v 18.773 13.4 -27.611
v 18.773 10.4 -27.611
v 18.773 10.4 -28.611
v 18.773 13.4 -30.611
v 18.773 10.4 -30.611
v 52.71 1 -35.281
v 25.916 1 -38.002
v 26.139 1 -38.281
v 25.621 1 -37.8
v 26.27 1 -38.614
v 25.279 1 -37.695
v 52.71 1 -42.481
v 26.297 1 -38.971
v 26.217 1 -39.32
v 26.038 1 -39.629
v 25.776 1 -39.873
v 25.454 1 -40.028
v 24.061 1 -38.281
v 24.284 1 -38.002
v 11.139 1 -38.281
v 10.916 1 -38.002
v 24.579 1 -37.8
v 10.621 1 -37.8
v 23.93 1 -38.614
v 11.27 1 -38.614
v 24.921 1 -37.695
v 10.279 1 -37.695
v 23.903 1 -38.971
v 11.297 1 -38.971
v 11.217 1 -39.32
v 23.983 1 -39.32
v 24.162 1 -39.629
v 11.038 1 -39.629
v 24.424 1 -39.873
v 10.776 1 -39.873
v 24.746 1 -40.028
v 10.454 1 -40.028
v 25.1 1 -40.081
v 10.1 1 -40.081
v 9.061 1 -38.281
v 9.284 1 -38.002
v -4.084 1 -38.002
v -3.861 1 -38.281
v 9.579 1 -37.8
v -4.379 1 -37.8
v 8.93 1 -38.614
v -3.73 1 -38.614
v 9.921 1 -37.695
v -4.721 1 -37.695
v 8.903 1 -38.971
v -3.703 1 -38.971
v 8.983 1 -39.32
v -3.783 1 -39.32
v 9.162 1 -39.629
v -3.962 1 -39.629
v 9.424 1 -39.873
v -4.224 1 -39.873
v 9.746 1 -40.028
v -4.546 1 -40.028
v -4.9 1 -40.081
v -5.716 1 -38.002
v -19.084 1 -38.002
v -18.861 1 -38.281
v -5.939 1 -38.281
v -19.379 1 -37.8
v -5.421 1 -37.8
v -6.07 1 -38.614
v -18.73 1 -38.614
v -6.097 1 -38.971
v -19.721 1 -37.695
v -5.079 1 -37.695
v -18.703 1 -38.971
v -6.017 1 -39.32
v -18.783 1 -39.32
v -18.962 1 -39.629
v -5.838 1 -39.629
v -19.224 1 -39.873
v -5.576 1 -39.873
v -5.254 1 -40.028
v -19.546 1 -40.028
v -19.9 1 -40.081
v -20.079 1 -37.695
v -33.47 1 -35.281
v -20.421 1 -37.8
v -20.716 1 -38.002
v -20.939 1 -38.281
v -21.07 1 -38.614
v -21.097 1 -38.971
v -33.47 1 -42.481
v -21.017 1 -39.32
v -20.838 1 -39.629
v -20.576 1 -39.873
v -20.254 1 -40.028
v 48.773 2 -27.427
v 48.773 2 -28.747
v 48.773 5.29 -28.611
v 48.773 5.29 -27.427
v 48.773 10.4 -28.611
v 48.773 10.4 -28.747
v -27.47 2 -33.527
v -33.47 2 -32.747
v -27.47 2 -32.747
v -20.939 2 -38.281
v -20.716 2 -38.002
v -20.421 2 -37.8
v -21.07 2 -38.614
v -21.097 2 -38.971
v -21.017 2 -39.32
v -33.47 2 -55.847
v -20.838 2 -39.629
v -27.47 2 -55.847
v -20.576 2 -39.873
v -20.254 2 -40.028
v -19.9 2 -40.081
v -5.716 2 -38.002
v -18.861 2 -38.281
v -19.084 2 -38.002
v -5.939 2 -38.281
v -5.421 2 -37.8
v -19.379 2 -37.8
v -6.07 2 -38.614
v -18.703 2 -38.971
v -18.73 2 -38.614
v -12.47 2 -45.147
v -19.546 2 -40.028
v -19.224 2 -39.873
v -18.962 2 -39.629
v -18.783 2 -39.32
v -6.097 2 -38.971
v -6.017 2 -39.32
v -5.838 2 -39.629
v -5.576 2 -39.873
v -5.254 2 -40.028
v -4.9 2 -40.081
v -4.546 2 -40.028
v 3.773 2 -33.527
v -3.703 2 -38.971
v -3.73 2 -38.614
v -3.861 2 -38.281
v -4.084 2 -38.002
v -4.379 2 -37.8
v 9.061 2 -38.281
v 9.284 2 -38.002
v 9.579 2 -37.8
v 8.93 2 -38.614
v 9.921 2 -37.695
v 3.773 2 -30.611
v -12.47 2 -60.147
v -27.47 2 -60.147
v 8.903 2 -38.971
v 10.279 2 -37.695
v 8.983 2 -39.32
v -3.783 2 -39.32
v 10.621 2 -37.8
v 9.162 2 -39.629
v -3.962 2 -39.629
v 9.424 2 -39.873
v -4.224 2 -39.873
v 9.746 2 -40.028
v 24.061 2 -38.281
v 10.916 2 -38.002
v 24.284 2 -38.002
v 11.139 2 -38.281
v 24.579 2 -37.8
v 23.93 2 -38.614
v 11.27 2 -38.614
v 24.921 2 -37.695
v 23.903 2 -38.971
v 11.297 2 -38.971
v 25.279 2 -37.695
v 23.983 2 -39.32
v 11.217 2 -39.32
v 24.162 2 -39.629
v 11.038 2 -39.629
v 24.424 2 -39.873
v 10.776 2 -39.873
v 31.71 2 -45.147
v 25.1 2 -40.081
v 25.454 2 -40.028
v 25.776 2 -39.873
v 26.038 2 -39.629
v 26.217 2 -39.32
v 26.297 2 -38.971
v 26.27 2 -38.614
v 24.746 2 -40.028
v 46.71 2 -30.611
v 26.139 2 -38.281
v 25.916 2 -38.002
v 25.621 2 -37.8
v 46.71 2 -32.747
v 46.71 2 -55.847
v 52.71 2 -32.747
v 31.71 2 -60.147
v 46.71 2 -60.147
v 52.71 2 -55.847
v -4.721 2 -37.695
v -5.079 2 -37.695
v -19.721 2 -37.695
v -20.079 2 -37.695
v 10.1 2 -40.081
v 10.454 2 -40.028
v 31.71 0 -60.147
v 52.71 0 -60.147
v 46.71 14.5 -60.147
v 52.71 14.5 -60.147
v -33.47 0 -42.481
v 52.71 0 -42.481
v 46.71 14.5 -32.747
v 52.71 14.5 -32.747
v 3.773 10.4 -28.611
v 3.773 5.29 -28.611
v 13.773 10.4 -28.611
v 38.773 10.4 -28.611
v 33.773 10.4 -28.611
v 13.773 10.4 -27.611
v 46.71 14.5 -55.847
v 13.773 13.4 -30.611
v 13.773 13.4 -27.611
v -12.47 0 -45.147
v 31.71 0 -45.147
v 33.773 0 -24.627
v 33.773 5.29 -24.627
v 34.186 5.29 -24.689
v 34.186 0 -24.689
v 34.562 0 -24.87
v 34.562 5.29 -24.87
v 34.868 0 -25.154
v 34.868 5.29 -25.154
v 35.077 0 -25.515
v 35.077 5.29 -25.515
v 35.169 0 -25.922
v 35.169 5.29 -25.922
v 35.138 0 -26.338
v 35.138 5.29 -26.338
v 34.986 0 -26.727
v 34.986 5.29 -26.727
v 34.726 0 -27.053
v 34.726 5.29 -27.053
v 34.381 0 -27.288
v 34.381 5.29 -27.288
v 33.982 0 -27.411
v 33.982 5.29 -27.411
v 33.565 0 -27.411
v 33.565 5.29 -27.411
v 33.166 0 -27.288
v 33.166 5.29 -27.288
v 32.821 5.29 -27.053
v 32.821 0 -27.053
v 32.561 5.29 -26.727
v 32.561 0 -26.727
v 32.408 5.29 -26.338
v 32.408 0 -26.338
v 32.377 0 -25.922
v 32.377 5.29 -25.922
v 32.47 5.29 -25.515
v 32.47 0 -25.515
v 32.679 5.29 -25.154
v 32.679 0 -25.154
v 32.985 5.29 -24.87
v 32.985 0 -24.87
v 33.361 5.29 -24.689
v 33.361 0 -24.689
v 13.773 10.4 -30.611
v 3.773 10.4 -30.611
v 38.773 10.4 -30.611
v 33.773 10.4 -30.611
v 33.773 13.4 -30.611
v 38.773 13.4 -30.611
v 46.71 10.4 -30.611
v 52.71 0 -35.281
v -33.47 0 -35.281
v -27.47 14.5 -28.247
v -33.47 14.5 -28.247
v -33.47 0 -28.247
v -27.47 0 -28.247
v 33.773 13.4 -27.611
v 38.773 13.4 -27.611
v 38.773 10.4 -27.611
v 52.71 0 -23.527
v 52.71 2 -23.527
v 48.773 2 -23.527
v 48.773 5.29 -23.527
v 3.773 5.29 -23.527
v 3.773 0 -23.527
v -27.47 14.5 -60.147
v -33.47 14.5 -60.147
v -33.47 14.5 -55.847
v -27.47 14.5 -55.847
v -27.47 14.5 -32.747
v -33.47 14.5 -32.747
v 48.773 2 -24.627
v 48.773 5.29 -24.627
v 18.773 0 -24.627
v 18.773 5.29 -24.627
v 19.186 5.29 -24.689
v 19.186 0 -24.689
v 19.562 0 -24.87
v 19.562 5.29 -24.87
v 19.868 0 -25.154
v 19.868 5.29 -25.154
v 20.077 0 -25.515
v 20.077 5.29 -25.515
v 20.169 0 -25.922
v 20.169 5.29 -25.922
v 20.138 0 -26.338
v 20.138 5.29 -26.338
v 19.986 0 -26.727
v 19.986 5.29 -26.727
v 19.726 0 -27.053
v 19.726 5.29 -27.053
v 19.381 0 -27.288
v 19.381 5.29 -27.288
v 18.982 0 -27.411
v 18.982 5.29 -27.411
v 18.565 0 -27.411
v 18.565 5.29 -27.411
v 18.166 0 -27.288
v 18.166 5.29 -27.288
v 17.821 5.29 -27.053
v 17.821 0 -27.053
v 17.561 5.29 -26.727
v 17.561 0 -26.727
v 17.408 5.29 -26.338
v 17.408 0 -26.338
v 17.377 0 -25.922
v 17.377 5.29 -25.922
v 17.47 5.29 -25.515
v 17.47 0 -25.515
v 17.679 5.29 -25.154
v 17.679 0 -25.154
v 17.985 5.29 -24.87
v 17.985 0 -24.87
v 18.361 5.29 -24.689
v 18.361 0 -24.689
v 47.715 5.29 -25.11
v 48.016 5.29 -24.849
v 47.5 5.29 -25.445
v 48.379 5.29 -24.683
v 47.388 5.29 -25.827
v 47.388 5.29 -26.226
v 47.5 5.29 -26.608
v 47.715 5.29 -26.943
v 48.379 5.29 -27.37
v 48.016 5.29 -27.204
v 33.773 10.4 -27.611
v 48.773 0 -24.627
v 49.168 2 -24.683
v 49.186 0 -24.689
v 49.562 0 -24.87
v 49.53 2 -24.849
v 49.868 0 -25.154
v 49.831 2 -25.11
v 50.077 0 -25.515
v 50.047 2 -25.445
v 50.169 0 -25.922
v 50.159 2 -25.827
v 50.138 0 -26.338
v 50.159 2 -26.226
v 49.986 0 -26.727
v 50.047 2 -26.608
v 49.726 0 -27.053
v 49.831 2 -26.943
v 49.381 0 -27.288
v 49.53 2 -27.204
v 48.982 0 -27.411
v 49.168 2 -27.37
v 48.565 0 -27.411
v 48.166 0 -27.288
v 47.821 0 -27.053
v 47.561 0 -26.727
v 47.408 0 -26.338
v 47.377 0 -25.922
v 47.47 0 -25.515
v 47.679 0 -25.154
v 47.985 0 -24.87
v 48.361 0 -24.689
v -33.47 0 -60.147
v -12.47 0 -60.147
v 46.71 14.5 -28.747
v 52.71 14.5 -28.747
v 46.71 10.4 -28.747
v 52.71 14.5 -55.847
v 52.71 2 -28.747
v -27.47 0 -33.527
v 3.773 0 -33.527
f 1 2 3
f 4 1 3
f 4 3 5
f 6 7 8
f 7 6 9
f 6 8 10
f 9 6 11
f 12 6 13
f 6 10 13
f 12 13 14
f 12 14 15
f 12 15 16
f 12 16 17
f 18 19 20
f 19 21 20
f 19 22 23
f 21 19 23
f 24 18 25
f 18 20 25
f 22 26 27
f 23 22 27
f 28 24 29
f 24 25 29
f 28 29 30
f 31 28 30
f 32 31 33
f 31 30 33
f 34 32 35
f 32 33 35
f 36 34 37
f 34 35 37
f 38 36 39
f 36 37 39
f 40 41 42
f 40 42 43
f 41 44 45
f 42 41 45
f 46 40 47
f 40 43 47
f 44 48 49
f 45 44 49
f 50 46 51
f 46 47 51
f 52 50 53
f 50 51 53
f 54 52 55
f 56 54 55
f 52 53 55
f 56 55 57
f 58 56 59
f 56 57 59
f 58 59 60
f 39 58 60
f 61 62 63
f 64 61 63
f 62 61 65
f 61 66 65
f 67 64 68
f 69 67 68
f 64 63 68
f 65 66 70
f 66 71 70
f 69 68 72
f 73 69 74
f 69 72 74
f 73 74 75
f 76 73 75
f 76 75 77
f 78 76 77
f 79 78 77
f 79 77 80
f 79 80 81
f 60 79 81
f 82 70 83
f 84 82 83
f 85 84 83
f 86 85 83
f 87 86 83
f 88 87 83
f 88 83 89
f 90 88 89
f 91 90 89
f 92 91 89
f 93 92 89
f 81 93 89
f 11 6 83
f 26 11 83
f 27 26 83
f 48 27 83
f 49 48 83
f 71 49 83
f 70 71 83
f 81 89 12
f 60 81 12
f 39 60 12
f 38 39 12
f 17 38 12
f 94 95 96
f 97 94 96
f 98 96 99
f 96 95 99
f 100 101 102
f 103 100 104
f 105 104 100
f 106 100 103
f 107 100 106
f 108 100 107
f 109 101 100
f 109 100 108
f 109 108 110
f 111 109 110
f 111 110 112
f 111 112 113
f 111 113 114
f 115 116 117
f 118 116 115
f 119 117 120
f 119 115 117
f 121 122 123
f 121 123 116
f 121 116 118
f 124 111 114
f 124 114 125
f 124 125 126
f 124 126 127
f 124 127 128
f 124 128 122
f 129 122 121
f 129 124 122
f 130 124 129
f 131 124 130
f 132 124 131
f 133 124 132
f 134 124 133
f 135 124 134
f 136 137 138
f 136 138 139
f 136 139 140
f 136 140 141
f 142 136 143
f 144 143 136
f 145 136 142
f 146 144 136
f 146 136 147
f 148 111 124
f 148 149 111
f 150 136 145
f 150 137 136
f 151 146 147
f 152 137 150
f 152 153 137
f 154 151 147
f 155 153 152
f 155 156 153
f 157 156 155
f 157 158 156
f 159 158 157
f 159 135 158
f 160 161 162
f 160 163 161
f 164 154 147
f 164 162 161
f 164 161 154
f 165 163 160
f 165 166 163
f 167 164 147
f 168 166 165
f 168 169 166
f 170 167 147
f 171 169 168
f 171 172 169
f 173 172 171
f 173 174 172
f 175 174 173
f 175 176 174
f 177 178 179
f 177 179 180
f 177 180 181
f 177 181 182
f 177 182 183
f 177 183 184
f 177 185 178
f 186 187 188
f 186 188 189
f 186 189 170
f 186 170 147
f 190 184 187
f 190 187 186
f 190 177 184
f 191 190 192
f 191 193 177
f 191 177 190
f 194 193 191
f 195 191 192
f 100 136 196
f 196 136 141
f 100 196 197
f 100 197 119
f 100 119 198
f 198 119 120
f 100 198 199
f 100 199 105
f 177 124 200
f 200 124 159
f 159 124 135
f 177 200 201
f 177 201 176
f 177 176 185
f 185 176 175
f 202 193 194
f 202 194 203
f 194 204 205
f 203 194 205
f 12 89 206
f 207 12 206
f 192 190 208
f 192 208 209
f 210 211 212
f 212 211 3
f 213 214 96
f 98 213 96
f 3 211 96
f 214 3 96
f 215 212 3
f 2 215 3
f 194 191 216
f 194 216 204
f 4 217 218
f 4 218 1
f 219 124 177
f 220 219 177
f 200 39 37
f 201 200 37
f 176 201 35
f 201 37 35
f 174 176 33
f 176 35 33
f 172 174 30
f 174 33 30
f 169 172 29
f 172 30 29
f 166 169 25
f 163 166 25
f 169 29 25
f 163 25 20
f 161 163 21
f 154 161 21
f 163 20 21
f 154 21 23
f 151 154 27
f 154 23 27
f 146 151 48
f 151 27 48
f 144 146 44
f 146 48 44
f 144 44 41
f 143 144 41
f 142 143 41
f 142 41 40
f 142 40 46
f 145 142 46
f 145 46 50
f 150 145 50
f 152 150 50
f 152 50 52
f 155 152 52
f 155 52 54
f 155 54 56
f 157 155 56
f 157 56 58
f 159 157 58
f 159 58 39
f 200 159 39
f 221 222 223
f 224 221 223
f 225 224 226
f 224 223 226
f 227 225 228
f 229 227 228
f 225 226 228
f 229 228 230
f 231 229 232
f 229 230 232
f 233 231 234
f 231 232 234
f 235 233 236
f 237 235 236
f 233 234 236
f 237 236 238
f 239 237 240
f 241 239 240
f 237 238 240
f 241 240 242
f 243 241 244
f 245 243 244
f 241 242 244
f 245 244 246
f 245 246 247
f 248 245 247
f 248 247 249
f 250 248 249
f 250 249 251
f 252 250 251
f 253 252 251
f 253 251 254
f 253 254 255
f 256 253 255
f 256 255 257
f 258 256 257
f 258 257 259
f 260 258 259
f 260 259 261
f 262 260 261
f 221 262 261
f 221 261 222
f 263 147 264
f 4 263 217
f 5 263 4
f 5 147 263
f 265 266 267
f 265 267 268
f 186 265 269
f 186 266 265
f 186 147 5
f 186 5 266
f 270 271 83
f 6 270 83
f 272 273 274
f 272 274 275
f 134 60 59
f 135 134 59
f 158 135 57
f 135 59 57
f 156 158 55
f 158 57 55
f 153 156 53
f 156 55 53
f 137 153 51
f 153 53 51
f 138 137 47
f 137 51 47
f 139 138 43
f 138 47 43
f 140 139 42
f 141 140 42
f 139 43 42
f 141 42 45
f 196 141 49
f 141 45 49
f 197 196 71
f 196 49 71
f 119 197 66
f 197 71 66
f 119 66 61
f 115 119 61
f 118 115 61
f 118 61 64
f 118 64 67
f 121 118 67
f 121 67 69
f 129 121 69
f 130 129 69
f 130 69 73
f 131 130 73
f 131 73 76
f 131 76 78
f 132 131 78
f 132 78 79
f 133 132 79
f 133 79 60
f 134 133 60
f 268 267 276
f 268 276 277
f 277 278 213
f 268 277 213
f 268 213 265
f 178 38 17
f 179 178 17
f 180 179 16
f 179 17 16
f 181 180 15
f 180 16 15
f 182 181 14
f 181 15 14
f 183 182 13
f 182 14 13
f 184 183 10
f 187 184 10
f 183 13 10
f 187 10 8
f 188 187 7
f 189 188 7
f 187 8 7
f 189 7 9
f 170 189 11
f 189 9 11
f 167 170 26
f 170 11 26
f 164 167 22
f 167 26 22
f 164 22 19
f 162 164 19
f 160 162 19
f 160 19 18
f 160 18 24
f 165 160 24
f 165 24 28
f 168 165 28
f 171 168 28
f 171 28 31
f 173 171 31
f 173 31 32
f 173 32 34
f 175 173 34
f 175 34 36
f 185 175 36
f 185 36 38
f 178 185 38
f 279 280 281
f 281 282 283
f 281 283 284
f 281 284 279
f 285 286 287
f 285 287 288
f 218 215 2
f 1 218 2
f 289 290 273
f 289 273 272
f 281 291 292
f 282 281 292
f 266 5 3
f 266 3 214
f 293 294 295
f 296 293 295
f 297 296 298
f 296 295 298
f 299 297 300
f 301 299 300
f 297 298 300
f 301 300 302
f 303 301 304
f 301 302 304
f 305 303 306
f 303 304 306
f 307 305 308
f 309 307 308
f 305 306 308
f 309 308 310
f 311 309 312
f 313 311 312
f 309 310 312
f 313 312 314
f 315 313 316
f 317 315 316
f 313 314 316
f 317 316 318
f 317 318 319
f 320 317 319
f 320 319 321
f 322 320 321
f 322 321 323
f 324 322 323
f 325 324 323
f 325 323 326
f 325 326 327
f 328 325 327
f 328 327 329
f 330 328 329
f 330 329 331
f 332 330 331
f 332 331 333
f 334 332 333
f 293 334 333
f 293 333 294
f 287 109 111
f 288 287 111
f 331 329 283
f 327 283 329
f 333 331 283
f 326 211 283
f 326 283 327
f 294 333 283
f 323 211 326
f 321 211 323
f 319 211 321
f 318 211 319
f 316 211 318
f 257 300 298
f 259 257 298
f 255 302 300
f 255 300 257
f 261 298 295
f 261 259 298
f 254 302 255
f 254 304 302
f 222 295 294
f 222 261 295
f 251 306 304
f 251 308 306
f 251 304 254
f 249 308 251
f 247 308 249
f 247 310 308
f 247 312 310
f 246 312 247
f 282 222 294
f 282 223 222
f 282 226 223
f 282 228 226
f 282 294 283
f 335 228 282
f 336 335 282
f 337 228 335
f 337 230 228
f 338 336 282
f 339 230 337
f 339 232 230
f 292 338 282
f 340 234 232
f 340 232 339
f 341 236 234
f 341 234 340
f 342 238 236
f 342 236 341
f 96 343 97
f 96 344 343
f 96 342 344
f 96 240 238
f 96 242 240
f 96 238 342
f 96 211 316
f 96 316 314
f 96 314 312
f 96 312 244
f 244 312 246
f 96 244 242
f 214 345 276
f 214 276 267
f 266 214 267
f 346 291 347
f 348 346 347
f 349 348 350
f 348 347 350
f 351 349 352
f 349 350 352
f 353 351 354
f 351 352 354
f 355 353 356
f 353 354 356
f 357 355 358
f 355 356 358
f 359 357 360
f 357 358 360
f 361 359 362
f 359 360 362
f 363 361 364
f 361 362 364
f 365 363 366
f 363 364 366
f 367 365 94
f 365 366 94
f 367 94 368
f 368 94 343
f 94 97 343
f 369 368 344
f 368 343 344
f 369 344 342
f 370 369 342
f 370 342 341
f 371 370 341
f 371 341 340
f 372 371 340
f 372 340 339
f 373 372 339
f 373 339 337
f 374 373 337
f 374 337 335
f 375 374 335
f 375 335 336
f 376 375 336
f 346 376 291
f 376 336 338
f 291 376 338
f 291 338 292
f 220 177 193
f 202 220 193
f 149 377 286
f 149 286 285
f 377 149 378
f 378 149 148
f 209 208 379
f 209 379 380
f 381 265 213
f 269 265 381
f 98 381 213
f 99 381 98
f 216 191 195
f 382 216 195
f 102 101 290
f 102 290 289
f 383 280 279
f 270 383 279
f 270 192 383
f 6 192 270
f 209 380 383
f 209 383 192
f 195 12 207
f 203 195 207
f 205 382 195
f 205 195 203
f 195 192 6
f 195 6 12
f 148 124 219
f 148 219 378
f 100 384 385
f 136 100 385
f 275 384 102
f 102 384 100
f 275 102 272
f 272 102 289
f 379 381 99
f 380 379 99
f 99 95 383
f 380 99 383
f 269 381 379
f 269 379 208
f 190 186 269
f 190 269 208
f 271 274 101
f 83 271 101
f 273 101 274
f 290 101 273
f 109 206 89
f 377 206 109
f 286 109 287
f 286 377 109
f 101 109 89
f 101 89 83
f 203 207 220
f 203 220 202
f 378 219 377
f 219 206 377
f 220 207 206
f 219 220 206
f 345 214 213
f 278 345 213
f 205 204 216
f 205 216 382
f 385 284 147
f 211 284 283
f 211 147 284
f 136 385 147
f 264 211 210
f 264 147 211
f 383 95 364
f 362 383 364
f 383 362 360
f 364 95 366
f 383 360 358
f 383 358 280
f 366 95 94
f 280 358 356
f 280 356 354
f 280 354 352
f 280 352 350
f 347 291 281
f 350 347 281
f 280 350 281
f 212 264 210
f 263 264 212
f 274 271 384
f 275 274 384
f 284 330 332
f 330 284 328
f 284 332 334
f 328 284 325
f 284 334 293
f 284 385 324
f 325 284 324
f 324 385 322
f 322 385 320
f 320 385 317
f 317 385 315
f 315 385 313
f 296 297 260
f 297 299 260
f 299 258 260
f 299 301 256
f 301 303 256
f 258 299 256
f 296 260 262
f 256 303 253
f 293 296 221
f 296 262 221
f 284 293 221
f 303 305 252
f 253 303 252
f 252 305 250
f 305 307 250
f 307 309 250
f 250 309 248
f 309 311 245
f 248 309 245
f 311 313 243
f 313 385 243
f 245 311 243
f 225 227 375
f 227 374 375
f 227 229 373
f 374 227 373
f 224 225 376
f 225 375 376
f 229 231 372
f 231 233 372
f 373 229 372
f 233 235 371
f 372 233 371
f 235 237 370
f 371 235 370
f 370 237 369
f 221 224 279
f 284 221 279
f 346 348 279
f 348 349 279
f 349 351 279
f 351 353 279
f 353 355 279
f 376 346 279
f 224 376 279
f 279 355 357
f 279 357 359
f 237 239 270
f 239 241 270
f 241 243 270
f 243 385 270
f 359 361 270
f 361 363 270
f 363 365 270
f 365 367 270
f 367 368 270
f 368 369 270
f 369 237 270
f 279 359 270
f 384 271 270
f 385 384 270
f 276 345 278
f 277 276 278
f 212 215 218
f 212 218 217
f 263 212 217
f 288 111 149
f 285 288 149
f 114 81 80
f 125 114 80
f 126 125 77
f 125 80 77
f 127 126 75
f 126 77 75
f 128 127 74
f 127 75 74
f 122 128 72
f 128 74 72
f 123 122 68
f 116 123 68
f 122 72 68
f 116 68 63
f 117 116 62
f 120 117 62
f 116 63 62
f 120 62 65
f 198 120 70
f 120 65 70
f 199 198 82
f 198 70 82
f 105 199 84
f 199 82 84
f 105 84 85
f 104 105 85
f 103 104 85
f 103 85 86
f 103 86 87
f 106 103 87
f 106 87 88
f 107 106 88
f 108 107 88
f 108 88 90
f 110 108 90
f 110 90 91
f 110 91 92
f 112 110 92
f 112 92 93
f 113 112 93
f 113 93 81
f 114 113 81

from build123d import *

# Parameters (mm, degrees)
EXTRUDE_1_DEPTH           = 2
CUT_EXTRUDE_1_DEPTH       = 2
SKETCH_3_W                = 3
SKETCH_3_H                = 3
EXTRUDE_2_DEPTH           = 12
EXTRUDE_3_DEPTH           = 12
SKETCH_5_R                = 0.75
CUT_EXTRUDE_2_DEPTH       = 12
SKETCH_6_R                = 0.75
CUT_EXTRUDE_3_DEPTH       = 12
SKETCH_7_W                = 26
SKETCH_7_H                = 60
EXTRUDE_4_DEPTH           = 2
SKETCH_8_W                = 3.705700703
SKETCH_8_H                = 4.457179677
SKETCH_8_W_2              = 1.523965484
SKETCH_8_H_2              = 4.5
EXTRUDE_5_DEPTH           = 14.4
SKETCH_9_R                = 0.95
CUT_EXTRUDE_4_DEPTH       = 14.4
SKETCH_10_W               = 26
SKETCH_10_H               = 8
EXTRUDE_6_DEPTH           = 2
SKETCH_11_W               = 4.5
SKETCH_11_H               = 4.5
EXTRUDE_7_DEPTH           = 14.4
SKETCH_12_R               = 0.95
CUT_EXTRUDE_5_DEPTH       = 14.4
FILLET_2_R                = 1
SKETCH_13_W               = 4.5
SKETCH_13_H               = 4.5
CUT_EXTRUDE_6_DEPTH       = 14.4
SKETCH_15_R               = 1.75
CUT_EXTRUDE_8_DEPTH       = 12
SKETCH_14_W               = 3
SKETCH_14_H               = 3
CUT_EXTRUDE_9_DEPTH       = 12
SKETCH_16_W               = 4.5
SKETCH_16_H               = 4.5
SKETCH_16_W_2             = 4.196061315
EXTRUDE_8_DEPTH           = 14.4
CUT_EXTRUDE_11_DEPTH      = 10
SKETCH_19_R               = 0.95
CUT_EXTRUDE_12_DEPTH      = 10
FILLET_3_R                = 1
SKETCH_21_W               = 2.552667246
SKETCH_21_H               = 4.5
EXTRUDE_9_DEPTH           = 14.4
CUT_EXTRUDE_14_DEPTH      = 79.074165065
CUT_EXTRUDE_14_DEPTH_BACK = 79.074165065
SKETCH_9_3_R              = 0.95
EXTRUDE_10_DEPTH          = 2
SKETCH_31_W               = 30
SKETCH_31_H               = 16
EXTRUDE_13_DEPTH          = 2
SKETCH_36_W               = 30
SKETCH_36_H               = 4
CUT_EXTRUDE_21_DEPTH      = 10
SKETCH_38_W               = 72
SKETCH_38_H               = 73.901085024
CUT_EXTRUDE_22_DEPTH      = 36.5
SKETCH_39_W               = 4.5
SKETCH_39_H               = 4.5
CUT_EXTRUDE_23_DEPTH      = 14.4
SKETCH_62_W               = 10
SKETCH_62_H               = 2
EXTRUDE_22_DEPTH          = 11.717956628
SKETCH_40_W               = 50
SKETCH_40_H               = 7.2
CUT_EXTRUDE_24_DEPTH      = 1
SKETCH_41_R               = 1.2
CUT_EXTRUDE_25_DEPTH      = 89.212970365
SKETCH_44_W               = 9
SKETCH_44_H               = 47.717956628
EXTRUDE_15_DEPTH          = 2
SKETCH_47_W               = 14
SKETCH_47_H               = 7.2
CUT_EXTRUDE_29_DEPTH      = 1
SKETCH_48_W               = 7
SKETCH_48_H               = 47.717956628
EXTRUDE_17_DEPTH          = 2
SKETCH_54_W               = 88
SKETCH_54_H               = 7.2
CUT_EXTRUDE_32_DEPTH      = 1
SKETCH_56_W               = 88
SKETCH_56_H               = 0.717956628
CUT_EXTRUDE_34_DEPTH      = 10
SKETCH_63_W               = 48.226708388
SKETCH_63_H               = 2
EXTRUDE_23_DEPTH          = 10
SKETCH_65_W               = 45
SKETCH_65_H               = 2
EXTRUDE_24_DEPTH          = 8.4
SKETCH_66_W               = 5
SKETCH_66_H               = 3
EXTRUDE_25_DEPTH          = 3
SKETCH_67_W               = 45
SKETCH_67_H               = 3.29
EXTRUDE_26_DEPTH          = 5.084597618
SKETCH_68_R               = 1.4
CUT_EXTRUDE_35_DEPTH      = 8
CUT_EXTRUDE_36_DEPTH      = 97.788884386
CUT_EXTRUDE_36_DEPTH_BACK = 97.788884386
SKETCH_69_W               = 46
SKETCH_69_H               = 12
SKETCH_75_W               = 6
SKETCH_75_H               = 4.3
SKETCH_75_H_2             = 4.5
SKETCH_75_H_3             = 4
EXTRUDE_30_DEPTH          = 12.5
EXTRUDE_31_DEPTH          = 0.71
SKETCH_77_W               = 6
SKETCH_77_H               = 2
EXTRUDE_32_DEPTH          = 5.279303266
CUT_EXTRUDE_39_DEPTH      = 2.53
SKETCH_79_W               = 86.18
SKETCH_79_H               = 8.379303266
CUT_EXTRUDE_40_DEPTH      = 2
SKETCH_80_W               = 44.18
SKETCH_80_H               = 15
CUT_EXTRUDE_41_DEPTH      = 12.5


with BuildPart() as part:
    # 草图1 → 凸台-拉伸1 (new body)
    with BuildSketch(Plane(origin=(0, 0, 0), x_dir=(1, 0, 0), z_dir=(0, 1, 0))):
        with BuildLine():
            Line((5, 0), (31, 0))
            Line((31, 0), (31, -12.266105287))
            Line((31, -12.266105287), (17.561663747, -40))
            Line((17.561663747, -40), (-17.561663747, -40))
            Line((-17.561663747, -40), (-31, -12.266105287))
            Line((-31, -12.266105287), (-31, 0))
            Line((-31, 0), (-5, 0))
            Line((-5, 0), (-5, -5))
            ThreePointArc((-5, -5), (0, -10), (5, -5))
            Line((5, -5), (5, 0))
        make_face()
    extrude(amount=EXTRUDE_1_DEPTH)

    # 草图2 → 切除-拉伸1 (cut)
    with BuildSketch(Plane.XZ):
        Polygon((-31, 0), (-24.370648345, 19.60824232), (-13.013264916, 35.515995547), (-4.410164775, 40), (-17.561663747, 40), (-31, 12.266105287), align=None)
    cut_extrude_1 = extrude(amount=-CUT_EXTRUDE_1_DEPTH, mode=Mode.SUBTRACT)

    # 镜向1: 切除-拉伸1 across plane
    add(cut_extrude_1.mirror(Plane(origin=(0, 0, 0), x_dir=(0, 0, 1), z_dir=(1, 0, 0))), mode=Mode.SUBTRACT)

    # 草图3 → 凸台-拉伸2 (add)
    with BuildSketch(Plane(origin=(0, 2, 0), x_dir=(1, 0, 0), z_dir=(0, 1, 0))):
        with Locations((0.264476572, -30.687696452)):
            Rectangle(SKETCH_3_W, SKETCH_3_H)
    extrude(amount=EXTRUDE_2_DEPTH)

    # 草图4 → 凸台-拉伸3 (add)
    with BuildSketch(Plane(origin=(0, 2, 0), x_dir=(1, 0, 0), z_dir=(0, 1, 0))):
        Polygon((12.325065561, -24.884390537), (14.54097081, -22.857655099), (12.419650467, -20.736334755), (10.298330123, -22.857655099), align=None)
    extrude_3 = extrude(amount=EXTRUDE_3_DEPTH)

    # 草图5 → 切除-拉伸2 (cut)
    with BuildSketch(Plane.ZY.offset(1.235523428)):
        with Locations((30.687696452, 11.5)):
            Circle(SKETCH_5_R)
        with Locations((30.687696452, 4.5)):
            Circle(SKETCH_5_R)
    extrude(amount=-CUT_EXTRUDE_2_DEPTH, mode=Mode.SUBTRACT)

    # 草图6 → 切除-拉伸3 (cut)
    with BuildSketch(Plane(origin=(18.192824737, 0, 30.752149712), x_dir=(0.7071067811865495, 0, 0.7071067811865457), z_dir=(-0.7071067811865457, 0, 0.7071067811865495))):
        with Locations((-9.798264607, 11.5)):
            Circle(SKETCH_6_R)
        with Locations((-9.798264607, 4.5)):
            Circle(SKETCH_6_R)
    cut_extrude_3 = extrude(amount=-CUT_EXTRUDE_3_DEPTH, mode=Mode.SUBTRACT)

    # 镜向2: 凸台-拉伸3, 切除-拉伸3 across plane
    add(extrude_3.mirror(Plane(origin=(0, 0, 0), x_dir=(0, 0, 1), z_dir=(1, 0, 0))))
    add(cut_extrude_3.mirror(Plane(origin=(0, 0, 0), x_dir=(0, 0, 1), z_dir=(1, 0, 0))), mode=Mode.SUBTRACT)

    # 草图7 → 凸台-拉伸4 (add)
    with BuildSketch(Plane(origin=(0, 2, 0), x_dir=(1, 0, 0), z_dir=(0, 1, 0))):
        with Locations((-18, 30)):
            Rectangle(SKETCH_7_W, SKETCH_7_H)
        with Locations((18, 30)):
            Rectangle(SKETCH_7_W, SKETCH_7_H)
    extrude(amount=-EXTRUDE_4_DEPTH)

    # 草图8 → 凸台-拉伸5 (add)
    with BuildSketch(Plane(origin=(0, 2, 0), x_dir=(1, 0, 0), z_dir=(0, 1, 0))):
        with Locations((28.776217622, 3.180021452)):
            Rectangle(SKETCH_8_W, SKETCH_8_H)
        with Locations((27.685350012, 30.55861129)):
            Rectangle(SKETCH_8_W_2, SKETCH_8_H_2)
    extrude_5 = extrude(amount=EXTRUDE_5_DEPTH)

    # 草图9 → 切除-拉伸4 (cut)
    with BuildSketch(Plane(origin=(31, 0, 0), x_dir=(0, 0, -1), z_dir=(1, 0, 0))):
        with Locations((3.00861129, 8.2)):
            Circle(SKETCH_9_R)
        with Locations((30.70861129, 8.2)):
            Circle(SKETCH_9_R)
    cut_extrude_4 = extrude(amount=-CUT_EXTRUDE_4_DEPTH, mode=Mode.SUBTRACT)

    # 镜向3: 凸台-拉伸5, 切除-拉伸4 across plane
    add(extrude_5.mirror(Plane(origin=(0, 0, 0), x_dir=(0, 0, 1), z_dir=(1, 0, 0))))
    add(cut_extrude_4.mirror(Plane(origin=(0, 0, 0), x_dir=(0, 0, 1), z_dir=(1, 0, 0))), mode=Mode.SUBTRACT)

    # 草图10 → 凸台-拉伸6 (add)
    with BuildSketch(Plane(origin=(0, 2, 0), x_dir=(1, 0, 0), z_dir=(0, 1, 0))):
        with Locations((-18, 64)):
            Rectangle(SKETCH_10_W, SKETCH_10_H)
        Polygon((5, 60), (5, 68), (30.798641436, 68), (31, 60), align=None)
    extrude(amount=-EXTRUDE_6_DEPTH)

    # 草图11 → 凸台-拉伸7 (add)
    with BuildSketch(Plane(origin=(0, 2, 0), x_dir=(1, 0, 0), z_dir=(0, 1, 0))):
        with Locations((18.529999999, 37.05861129)):
            Rectangle(SKETCH_11_W, SKETCH_11_H)
        with Locations((18.529999999, 64.45861129)):
            Rectangle(SKETCH_11_W, SKETCH_11_H)
    extrude(amount=EXTRUDE_7_DEPTH)

    # 草图12 → 切除-拉伸5 (cut)
    with BuildSketch(Plane.ZY.offset(-16.279999999)):
        with Locations((-36.90861129, 8.2)):
            Circle(SKETCH_12_R)
        with Locations((-64.60861129, 8.2)):
            Circle(SKETCH_12_R)
    extrude(amount=-CUT_EXTRUDE_5_DEPTH, mode=Mode.SUBTRACT)

    # 圆角2
    fillet_2_edges = [part.edges().sort_by_distance(p)[0] for p in [
        (26.92336727, 9.2, -5.40861129),
        (26.92336727, 9.2, -28.30861129),
        (-26.92336727, 9.2, -5.40861129),
        (-26.92336727, 9.2, -28.30861129),
        (16.279999999, 9.2, -39.30861129),
        (16.279999999, 9.2, -62.20861129),
    ]]
    fillet(fillet_2_edges, radius=FILLET_2_R)

    # 草图13 → 切除-拉伸6 (cut)
    with BuildSketch(Plane(origin=(0, 16.4, 0), x_dir=(1, 0, 0), z_dir=(0, 1, 0))):
        with Locations((18.529999999, 37.05861129)):
            Rectangle(SKETCH_13_W, SKETCH_13_H)
        with Locations((18.529999999, 64.45861129)):
            Rectangle(SKETCH_13_W, SKETCH_13_H)
    extrude(amount=-CUT_EXTRUDE_6_DEPTH, mode=Mode.SUBTRACT)

    # 草图15 → 切除-拉伸8 (cut)
    with BuildSketch(Plane(origin=(0, 2, 0), x_dir=(1, 0, 0), z_dir=(0, 1, 0))):
        with Locations(Location((-6.235523428, -30.687696452, 0), (0, 0, 270))):
            Circle(SKETCH_15_R)
        with Locations(Location((6.764476572, -30.687696452, 0), (0, 0, 270))):
            Circle(SKETCH_15_R)
    extrude(amount=-CUT_EXTRUDE_8_DEPTH, mode=Mode.SUBTRACT)

    # 草图14 → 切除-拉伸9 (cut)
    with BuildSketch(Plane(origin=(0, 14, 0), x_dir=(1, 0, 0), z_dir=(0, 1, 0))):
        with Locations((0.264476572, -30.687696452)):
            Rectangle(SKETCH_14_W, SKETCH_14_H)
    extrude(amount=-CUT_EXTRUDE_9_DEPTH, mode=Mode.SUBTRACT)

    # 草图16 → 凸台-拉伸8 (add)
    with BuildSketch(Plane.XZ):
        with Locations((-18.720947438, -42.276567918)):
            Rectangle(SKETCH_16_W, SKETCH_16_H)
        with Locations((-18.568978096, -14.876567918)):
            Rectangle(SKETCH_16_W_2, SKETCH_16_H)
    extrude(amount=EXTRUDE_8_DEPTH)

    # 草图17 → 切除-拉伸11 (cut)
    with BuildSketch(Plane.XZ):
        Polygon((-20.970947438, -44.526567918), (-31, -44.526567918), (-37.437571986, -44.526567918), (-37.437571986, -68), (-31, -68), (30.798641436, -68), (38.694931003, -68), (38.694931003, -44.526567918), (31, -44.526567918), align=None)
    extrude(amount=-CUT_EXTRUDE_11_DEPTH, mode=Mode.SUBTRACT)

    # 草图19 → 切除-拉伸12 (cut)
    with BuildSketch(Plane(origin=(-16.470947438, 0, 0), x_dir=(0, 0, -1), z_dir=(1, 0, 0))):
        with Locations((14.726567918, -6.2)):
            Circle(SKETCH_19_R)
        with Locations((42.426567918, -6.2)):
            Circle(SKETCH_19_R)
    extrude(amount=-CUT_EXTRUDE_12_DEPTH, mode=Mode.SUBTRACT)

    # 圆角3
    fillet_3_edges = [part.edges().sort_by_distance(p)[0] for p in [
        (-16.470947438, -7.2, -40.026567918),
        (-16.470947438, -7.2, -17.126567918),
    ]]
    fillet(fillet_3_edges, radius=FILLET_3_R)

    # 草图21 → 凸台-拉伸9 (add)
    with BuildSketch(Plane(origin=(0, 2, 0), x_dir=(1, 0, 0), z_dir=(0, 1, 0))):
        with Locations((-29.723666377, 30.55861129)):
            Rectangle(SKETCH_21_W, SKETCH_21_H)
        with Locations((29.723666377, 30.55861129)):
            Rectangle(SKETCH_21_W, SKETCH_21_H)
    extrude(amount=EXTRUDE_9_DEPTH)

    # 草图9<3> → 切除-拉伸14 (cut, two sides: drawn at the far end of the back side and taken through both)
    with BuildSketch(Plane(origin=(31, 0, 0), x_dir=(0, 0, -1), z_dir=(1, 0, 0)).offset(-CUT_EXTRUDE_14_DEPTH_BACK)):
        with Locations((3.00861129, 8.2)):
            Circle(SKETCH_9_3_R)
        with Locations((30.70861129, 8.2)):
            Circle(SKETCH_9_3_R)
    extrude(amount=CUT_EXTRUDE_14_DEPTH + CUT_EXTRUDE_14_DEPTH_BACK, mode=Mode.SUBTRACT)

    # 草图22 → 凸台-拉伸10 (add)
    with BuildSketch(Plane(origin=(0, 2, 0), x_dir=(1, 0, 0), z_dir=(0, 1, 0))):
        Polygon((31, 68.526567918), (-31, 68.526567918), (-36, 68.526567918), (-36, 32.80861129), (-31, 32.80861129), (-31, 44.526567918), (31, 44.526567918), (31, 32.80861129), (36, 32.80861129), (36, 68.526567918), align=None)
    extrude(amount=-EXTRUDE_10_DEPTH)

    # 草图31 → 凸台-拉伸13 (add)
    with BuildSketch(Plane(origin=(0, 2, 0), x_dir=(1, 0, 0), z_dir=(0, 1, 0))):
        with Locations((21, 76.526567918)):
            Rectangle(SKETCH_31_W, SKETCH_31_H)
    extrude(amount=-EXTRUDE_13_DEPTH)

    # 草图36 → 切除-拉伸21 (cut)
    with BuildSketch(Plane.XZ):
        with Locations((21, -82.526567918)):
            Rectangle(SKETCH_36_W, SKETCH_36_H)
    extrude(amount=-CUT_EXTRUDE_21_DEPTH, mode=Mode.SUBTRACT)

    # 草图38 → 切除-拉伸22 (cut, symmetric)
    with BuildSketch(Plane(origin=(0, 2, 0), x_dir=(1, 0, 0), z_dir=(0, 1, 0))):
        with Locations((0, -4.141931222)):
            Rectangle(SKETCH_38_W, SKETCH_38_H)
    extrude(amount=CUT_EXTRUDE_22_DEPTH, both=True, mode=Mode.SUBTRACT)

    # 草图39 → 切除-拉伸23 (cut)
    with BuildSketch(Plane.XZ.offset(14.4)):
        with Locations((-18.720947438, -42.276567918)):
            Rectangle(SKETCH_39_W, SKETCH_39_H)
    extrude(amount=-CUT_EXTRUDE_23_DEPTH, mode=Mode.SUBTRACT)

    # 草图62 → 凸台-拉伸22 (add)
    with BuildSketch(Plane.XY.offset(-44.526567918)):
        with Locations((0, 1)):
            Rectangle(SKETCH_62_W, SKETCH_62_H)
    extrude(amount=EXTRUDE_22_DEPTH)

    # 草图40 → 切除-拉伸24 (cut)
    with BuildSketch(Plane.XZ):
        with Locations((0, -38.881165536)):
            Rectangle(SKETCH_40_W, SKETCH_40_H)
    extrude(amount=-CUT_EXTRUDE_24_DEPTH, mode=Mode.SUBTRACT)

    # 草图41 → 切除-拉伸25 (cut, through all)
    with BuildSketch(Plane.XZ.offset(-1)):
        with Locations(Location((-19.9, -38.881165536, 0), (0, 0, 270))):
            Circle(SKETCH_41_R)
        with Locations(Location((-4.9, -38.881165536, 0), (0, 0, 270))):
            Circle(SKETCH_41_R)
        with Locations(Location((10.1, -38.881165536, 0), (0, 0, 270))):
            Circle(SKETCH_41_R)
        with Locations(Location((25.1, -38.881165536, 0), (0, 0, 270))):
            Circle(SKETCH_41_R)
    extrude(amount=-CUT_EXTRUDE_25_DEPTH, mode=Mode.SUBTRACT)

    # 草图44 → 凸台-拉伸15 (add)
    with BuildSketch(Plane(origin=(0, 2, 0), x_dir=(1, 0, 0), z_dir=(0, 1, 0))):
        with Locations((40.5, 56.667589604)):
            Rectangle(SKETCH_44_W, SKETCH_44_H)
    extrude(amount=-EXTRUDE_15_DEPTH)

    # 草图47 → 切除-拉伸29 (cut)
    with BuildSketch(Plane.XZ):
        with Locations((32, -38.881165536)):
            Rectangle(SKETCH_47_W, SKETCH_47_H)
    extrude(amount=-CUT_EXTRUDE_29_DEPTH, mode=Mode.SUBTRACT)

    # 草图48 → 凸台-拉伸17 (add)
    with BuildSketch(Plane(origin=(0, 2, 0), x_dir=(1, 0, 0), z_dir=(0, 1, 0))):
        with Locations((48.5, 56.667589604)):
            Rectangle(SKETCH_48_W, SKETCH_48_H)
    extrude(amount=-EXTRUDE_17_DEPTH)

    # 草图54 → 切除-拉伸32 (cut)
    with BuildSketch(Plane.XZ):
        with Locations((8, -38.881165536)):
            Rectangle(SKETCH_54_W, SKETCH_54_H)
    extrude(amount=-CUT_EXTRUDE_32_DEPTH, mode=Mode.SUBTRACT)

    # 草图56 → 切除-拉伸34 (cut)
    with BuildSketch(Plane.XZ):
        with Locations((8, -33.167589604)):
            Rectangle(SKETCH_56_W, SKETCH_56_H)
    extrude(amount=-CUT_EXTRUDE_34_DEPTH, mode=Mode.SUBTRACT)

    # 草图63 → 凸台-拉伸23 (add)
    with BuildSketch(Plane.XY.offset(-33.526567918)):
        with Locations((27.886645806, 1)):
            Rectangle(SKETCH_63_W, SKETCH_63_H)
    extrude(amount=EXTRUDE_23_DEPTH)

    # 草图65 → 凸台-拉伸24 (add)
    with BuildSketch(Plane(origin=(0, 2, 0), x_dir=(1, 0, 0), z_dir=(0, 1, 0))):
        with Locations((26.273291612, 29.611165536)):
            Rectangle(SKETCH_65_W, SKETCH_65_H)
    extrude(amount=EXTRUDE_24_DEPTH)

    # 草图66 → 凸台-拉伸25 (add)
    with BuildSketch(Plane(origin=(0, 10.4, 0), x_dir=(1, 0, 0), z_dir=(0, 1, 0))):
        with Locations((36.273291612, 29.111165536)):
            Rectangle(SKETCH_66_W, SKETCH_66_H)
        with Locations((16.273291612, 29.111165536)):
            Rectangle(SKETCH_66_W, SKETCH_66_H)
    extrude(amount=EXTRUDE_25_DEPTH)

    # 草图67 → 凸台-拉伸26 (add)
    with BuildSketch(Plane.XY.offset(-28.611165536)):
        with Locations((26.273291612, 3.645)):
            Rectangle(SKETCH_67_W, SKETCH_67_H)
    extrude(amount=EXTRUDE_26_DEPTH)

    # 草图68 → 切除-拉伸35 (cut)
    with BuildSketch(Plane(origin=(0, 5.29, 0), x_dir=(1, 0, 0), z_dir=(0, 1, 0))):
        with Locations(Location((33.773291612, 26.026567918, 0), (0, 0, 270))):
            Circle(SKETCH_68_R)
        with Locations(Location((18.773291612, 26.026567918, 0), (0, 0, 270))):
            Circle(SKETCH_68_R)
        with Locations(Location((48.773291612, 26.026567918, 0), (0, 0, 270))):
            Circle(SKETCH_68_R)
    extrude(amount=-CUT_EXTRUDE_35_DEPTH, mode=Mode.SUBTRACT)

    # 草图69 → 切除-拉伸36 (cut, two sides: drawn at the far end of the back side and taken through both)
    with BuildSketch(Plane.XZ.offset(-CUT_EXTRUDE_36_DEPTH_BACK)):
        with Locations((29, -74.526567918)):
            Rectangle(SKETCH_69_W, SKETCH_69_H)
    extrude(amount=CUT_EXTRUDE_36_DEPTH + CUT_EXTRUDE_36_DEPTH_BACK, mode=Mode.SUBTRACT)

    # 草图75 → 凸台-拉伸30 (add)
    with BuildSketch(Plane(origin=(0, 2, 0), x_dir=(1, 0, 0), z_dir=(0, 1, 0))):
        with Locations((-30.47, 57.997264652)):
            Rectangle(SKETCH_75_W, SKETCH_75_H)
        with Locations((-30.47, 30.497264652)):
            Rectangle(SKETCH_75_W, SKETCH_75_H_2)
        with Locations((49.71, 30.747264652)):
            Rectangle(SKETCH_75_W, SKETCH_75_H_3)
        with Locations((49.71, 57.997264652)):
            Rectangle(SKETCH_75_W, SKETCH_75_H)
    extrude(amount=EXTRUDE_30_DEPTH)


with BuildPart() as extrude_30_piece_1:
    # of the separate pieces the step leaves, piece 1, a body of its own (extrude_30_pieces)
    add(part.part.solids().sort_by_distance((3.773291612, 0, -33.526567918))[0])

    # 草图76 → 凸台-拉伸31 (add)
    with BuildSketch(Plane(origin=(52, 0, 0), x_dir=(0, 0, -1), z_dir=(1, 0, 0))):
        Polygon((68.526567918, 0), (68.526567918, 2), (60.147264652, 2), (55.847264652, 2), (32.747264652, 2), (28.747264652, 2), (23.526567918, 2), (23.526567918, 0), (35.281165536, 0), (35.281165536, 1), (42.481165536, 1), (42.481165536, 0), align=None)
    extrude(amount=EXTRUDE_31_DEPTH)



with BuildPart() as extrude_30_piece_2:
    # of the separate pieces the step leaves, piece 2, a body of its own (extrude_30_pieces)
    add(part.part.solids().sort_by_distance((-33.47, 2, -32.747264652))[0])


with BuildPart() as extrude_30_piece_1_1:
    add(extrude_30_piece_1.part)

    add(extrude_30_piece_2.part)  # 凸台-拉伸32 merges 凸台-拉伸30 piece 2
    # 草图77 → 凸台-拉伸32 (add)
    with BuildSketch(Plane.XY.offset(-33.526567918)):
        with Locations((-30.47, 1)):
            Rectangle(SKETCH_77_W, SKETCH_77_H)
    extrude(amount=EXTRUDE_32_DEPTH)

    # 草图78 → 切除-拉伸39 (cut)
    with BuildSketch(Plane.ZY.offset(36)):
        Polygon((-33.526567918, 0), (-33.526567918, 2), (-68.526567918, 2), (-68.526567918, 0), (-42.481165536, 0), (-42.481165536, 1), (-35.281165536, 1), (-35.281165536, 0), align=None)
    extrude(amount=-CUT_EXTRUDE_39_DEPTH, mode=Mode.SUBTRACT)

    # 草图79 → 切除-拉伸40 (cut)
    with BuildSketch(Plane(origin=(0, 2, 0), x_dir=(1, 0, 0), z_dir=(0, 1, 0))):
        with Locations((9.62, 64.336916285)):
            Rectangle(SKETCH_79_W, SKETCH_79_H)
    extrude(amount=-CUT_EXTRUDE_40_DEPTH, mode=Mode.SUBTRACT)

    # 草图80 → 切除-拉伸41 (cut)
    with BuildSketch(Plane(origin=(0, 2, 0), x_dir=(1, 0, 0), z_dir=(0, 1, 0))):
        with Locations((9.62, 52.647264652)):
            Rectangle(SKETCH_80_W, SKETCH_80_H)
    extrude(amount=-CUT_EXTRUDE_41_DEPTH, mode=Mode.SUBTRACT)


solid = extrude_30_piece_1_1.part
